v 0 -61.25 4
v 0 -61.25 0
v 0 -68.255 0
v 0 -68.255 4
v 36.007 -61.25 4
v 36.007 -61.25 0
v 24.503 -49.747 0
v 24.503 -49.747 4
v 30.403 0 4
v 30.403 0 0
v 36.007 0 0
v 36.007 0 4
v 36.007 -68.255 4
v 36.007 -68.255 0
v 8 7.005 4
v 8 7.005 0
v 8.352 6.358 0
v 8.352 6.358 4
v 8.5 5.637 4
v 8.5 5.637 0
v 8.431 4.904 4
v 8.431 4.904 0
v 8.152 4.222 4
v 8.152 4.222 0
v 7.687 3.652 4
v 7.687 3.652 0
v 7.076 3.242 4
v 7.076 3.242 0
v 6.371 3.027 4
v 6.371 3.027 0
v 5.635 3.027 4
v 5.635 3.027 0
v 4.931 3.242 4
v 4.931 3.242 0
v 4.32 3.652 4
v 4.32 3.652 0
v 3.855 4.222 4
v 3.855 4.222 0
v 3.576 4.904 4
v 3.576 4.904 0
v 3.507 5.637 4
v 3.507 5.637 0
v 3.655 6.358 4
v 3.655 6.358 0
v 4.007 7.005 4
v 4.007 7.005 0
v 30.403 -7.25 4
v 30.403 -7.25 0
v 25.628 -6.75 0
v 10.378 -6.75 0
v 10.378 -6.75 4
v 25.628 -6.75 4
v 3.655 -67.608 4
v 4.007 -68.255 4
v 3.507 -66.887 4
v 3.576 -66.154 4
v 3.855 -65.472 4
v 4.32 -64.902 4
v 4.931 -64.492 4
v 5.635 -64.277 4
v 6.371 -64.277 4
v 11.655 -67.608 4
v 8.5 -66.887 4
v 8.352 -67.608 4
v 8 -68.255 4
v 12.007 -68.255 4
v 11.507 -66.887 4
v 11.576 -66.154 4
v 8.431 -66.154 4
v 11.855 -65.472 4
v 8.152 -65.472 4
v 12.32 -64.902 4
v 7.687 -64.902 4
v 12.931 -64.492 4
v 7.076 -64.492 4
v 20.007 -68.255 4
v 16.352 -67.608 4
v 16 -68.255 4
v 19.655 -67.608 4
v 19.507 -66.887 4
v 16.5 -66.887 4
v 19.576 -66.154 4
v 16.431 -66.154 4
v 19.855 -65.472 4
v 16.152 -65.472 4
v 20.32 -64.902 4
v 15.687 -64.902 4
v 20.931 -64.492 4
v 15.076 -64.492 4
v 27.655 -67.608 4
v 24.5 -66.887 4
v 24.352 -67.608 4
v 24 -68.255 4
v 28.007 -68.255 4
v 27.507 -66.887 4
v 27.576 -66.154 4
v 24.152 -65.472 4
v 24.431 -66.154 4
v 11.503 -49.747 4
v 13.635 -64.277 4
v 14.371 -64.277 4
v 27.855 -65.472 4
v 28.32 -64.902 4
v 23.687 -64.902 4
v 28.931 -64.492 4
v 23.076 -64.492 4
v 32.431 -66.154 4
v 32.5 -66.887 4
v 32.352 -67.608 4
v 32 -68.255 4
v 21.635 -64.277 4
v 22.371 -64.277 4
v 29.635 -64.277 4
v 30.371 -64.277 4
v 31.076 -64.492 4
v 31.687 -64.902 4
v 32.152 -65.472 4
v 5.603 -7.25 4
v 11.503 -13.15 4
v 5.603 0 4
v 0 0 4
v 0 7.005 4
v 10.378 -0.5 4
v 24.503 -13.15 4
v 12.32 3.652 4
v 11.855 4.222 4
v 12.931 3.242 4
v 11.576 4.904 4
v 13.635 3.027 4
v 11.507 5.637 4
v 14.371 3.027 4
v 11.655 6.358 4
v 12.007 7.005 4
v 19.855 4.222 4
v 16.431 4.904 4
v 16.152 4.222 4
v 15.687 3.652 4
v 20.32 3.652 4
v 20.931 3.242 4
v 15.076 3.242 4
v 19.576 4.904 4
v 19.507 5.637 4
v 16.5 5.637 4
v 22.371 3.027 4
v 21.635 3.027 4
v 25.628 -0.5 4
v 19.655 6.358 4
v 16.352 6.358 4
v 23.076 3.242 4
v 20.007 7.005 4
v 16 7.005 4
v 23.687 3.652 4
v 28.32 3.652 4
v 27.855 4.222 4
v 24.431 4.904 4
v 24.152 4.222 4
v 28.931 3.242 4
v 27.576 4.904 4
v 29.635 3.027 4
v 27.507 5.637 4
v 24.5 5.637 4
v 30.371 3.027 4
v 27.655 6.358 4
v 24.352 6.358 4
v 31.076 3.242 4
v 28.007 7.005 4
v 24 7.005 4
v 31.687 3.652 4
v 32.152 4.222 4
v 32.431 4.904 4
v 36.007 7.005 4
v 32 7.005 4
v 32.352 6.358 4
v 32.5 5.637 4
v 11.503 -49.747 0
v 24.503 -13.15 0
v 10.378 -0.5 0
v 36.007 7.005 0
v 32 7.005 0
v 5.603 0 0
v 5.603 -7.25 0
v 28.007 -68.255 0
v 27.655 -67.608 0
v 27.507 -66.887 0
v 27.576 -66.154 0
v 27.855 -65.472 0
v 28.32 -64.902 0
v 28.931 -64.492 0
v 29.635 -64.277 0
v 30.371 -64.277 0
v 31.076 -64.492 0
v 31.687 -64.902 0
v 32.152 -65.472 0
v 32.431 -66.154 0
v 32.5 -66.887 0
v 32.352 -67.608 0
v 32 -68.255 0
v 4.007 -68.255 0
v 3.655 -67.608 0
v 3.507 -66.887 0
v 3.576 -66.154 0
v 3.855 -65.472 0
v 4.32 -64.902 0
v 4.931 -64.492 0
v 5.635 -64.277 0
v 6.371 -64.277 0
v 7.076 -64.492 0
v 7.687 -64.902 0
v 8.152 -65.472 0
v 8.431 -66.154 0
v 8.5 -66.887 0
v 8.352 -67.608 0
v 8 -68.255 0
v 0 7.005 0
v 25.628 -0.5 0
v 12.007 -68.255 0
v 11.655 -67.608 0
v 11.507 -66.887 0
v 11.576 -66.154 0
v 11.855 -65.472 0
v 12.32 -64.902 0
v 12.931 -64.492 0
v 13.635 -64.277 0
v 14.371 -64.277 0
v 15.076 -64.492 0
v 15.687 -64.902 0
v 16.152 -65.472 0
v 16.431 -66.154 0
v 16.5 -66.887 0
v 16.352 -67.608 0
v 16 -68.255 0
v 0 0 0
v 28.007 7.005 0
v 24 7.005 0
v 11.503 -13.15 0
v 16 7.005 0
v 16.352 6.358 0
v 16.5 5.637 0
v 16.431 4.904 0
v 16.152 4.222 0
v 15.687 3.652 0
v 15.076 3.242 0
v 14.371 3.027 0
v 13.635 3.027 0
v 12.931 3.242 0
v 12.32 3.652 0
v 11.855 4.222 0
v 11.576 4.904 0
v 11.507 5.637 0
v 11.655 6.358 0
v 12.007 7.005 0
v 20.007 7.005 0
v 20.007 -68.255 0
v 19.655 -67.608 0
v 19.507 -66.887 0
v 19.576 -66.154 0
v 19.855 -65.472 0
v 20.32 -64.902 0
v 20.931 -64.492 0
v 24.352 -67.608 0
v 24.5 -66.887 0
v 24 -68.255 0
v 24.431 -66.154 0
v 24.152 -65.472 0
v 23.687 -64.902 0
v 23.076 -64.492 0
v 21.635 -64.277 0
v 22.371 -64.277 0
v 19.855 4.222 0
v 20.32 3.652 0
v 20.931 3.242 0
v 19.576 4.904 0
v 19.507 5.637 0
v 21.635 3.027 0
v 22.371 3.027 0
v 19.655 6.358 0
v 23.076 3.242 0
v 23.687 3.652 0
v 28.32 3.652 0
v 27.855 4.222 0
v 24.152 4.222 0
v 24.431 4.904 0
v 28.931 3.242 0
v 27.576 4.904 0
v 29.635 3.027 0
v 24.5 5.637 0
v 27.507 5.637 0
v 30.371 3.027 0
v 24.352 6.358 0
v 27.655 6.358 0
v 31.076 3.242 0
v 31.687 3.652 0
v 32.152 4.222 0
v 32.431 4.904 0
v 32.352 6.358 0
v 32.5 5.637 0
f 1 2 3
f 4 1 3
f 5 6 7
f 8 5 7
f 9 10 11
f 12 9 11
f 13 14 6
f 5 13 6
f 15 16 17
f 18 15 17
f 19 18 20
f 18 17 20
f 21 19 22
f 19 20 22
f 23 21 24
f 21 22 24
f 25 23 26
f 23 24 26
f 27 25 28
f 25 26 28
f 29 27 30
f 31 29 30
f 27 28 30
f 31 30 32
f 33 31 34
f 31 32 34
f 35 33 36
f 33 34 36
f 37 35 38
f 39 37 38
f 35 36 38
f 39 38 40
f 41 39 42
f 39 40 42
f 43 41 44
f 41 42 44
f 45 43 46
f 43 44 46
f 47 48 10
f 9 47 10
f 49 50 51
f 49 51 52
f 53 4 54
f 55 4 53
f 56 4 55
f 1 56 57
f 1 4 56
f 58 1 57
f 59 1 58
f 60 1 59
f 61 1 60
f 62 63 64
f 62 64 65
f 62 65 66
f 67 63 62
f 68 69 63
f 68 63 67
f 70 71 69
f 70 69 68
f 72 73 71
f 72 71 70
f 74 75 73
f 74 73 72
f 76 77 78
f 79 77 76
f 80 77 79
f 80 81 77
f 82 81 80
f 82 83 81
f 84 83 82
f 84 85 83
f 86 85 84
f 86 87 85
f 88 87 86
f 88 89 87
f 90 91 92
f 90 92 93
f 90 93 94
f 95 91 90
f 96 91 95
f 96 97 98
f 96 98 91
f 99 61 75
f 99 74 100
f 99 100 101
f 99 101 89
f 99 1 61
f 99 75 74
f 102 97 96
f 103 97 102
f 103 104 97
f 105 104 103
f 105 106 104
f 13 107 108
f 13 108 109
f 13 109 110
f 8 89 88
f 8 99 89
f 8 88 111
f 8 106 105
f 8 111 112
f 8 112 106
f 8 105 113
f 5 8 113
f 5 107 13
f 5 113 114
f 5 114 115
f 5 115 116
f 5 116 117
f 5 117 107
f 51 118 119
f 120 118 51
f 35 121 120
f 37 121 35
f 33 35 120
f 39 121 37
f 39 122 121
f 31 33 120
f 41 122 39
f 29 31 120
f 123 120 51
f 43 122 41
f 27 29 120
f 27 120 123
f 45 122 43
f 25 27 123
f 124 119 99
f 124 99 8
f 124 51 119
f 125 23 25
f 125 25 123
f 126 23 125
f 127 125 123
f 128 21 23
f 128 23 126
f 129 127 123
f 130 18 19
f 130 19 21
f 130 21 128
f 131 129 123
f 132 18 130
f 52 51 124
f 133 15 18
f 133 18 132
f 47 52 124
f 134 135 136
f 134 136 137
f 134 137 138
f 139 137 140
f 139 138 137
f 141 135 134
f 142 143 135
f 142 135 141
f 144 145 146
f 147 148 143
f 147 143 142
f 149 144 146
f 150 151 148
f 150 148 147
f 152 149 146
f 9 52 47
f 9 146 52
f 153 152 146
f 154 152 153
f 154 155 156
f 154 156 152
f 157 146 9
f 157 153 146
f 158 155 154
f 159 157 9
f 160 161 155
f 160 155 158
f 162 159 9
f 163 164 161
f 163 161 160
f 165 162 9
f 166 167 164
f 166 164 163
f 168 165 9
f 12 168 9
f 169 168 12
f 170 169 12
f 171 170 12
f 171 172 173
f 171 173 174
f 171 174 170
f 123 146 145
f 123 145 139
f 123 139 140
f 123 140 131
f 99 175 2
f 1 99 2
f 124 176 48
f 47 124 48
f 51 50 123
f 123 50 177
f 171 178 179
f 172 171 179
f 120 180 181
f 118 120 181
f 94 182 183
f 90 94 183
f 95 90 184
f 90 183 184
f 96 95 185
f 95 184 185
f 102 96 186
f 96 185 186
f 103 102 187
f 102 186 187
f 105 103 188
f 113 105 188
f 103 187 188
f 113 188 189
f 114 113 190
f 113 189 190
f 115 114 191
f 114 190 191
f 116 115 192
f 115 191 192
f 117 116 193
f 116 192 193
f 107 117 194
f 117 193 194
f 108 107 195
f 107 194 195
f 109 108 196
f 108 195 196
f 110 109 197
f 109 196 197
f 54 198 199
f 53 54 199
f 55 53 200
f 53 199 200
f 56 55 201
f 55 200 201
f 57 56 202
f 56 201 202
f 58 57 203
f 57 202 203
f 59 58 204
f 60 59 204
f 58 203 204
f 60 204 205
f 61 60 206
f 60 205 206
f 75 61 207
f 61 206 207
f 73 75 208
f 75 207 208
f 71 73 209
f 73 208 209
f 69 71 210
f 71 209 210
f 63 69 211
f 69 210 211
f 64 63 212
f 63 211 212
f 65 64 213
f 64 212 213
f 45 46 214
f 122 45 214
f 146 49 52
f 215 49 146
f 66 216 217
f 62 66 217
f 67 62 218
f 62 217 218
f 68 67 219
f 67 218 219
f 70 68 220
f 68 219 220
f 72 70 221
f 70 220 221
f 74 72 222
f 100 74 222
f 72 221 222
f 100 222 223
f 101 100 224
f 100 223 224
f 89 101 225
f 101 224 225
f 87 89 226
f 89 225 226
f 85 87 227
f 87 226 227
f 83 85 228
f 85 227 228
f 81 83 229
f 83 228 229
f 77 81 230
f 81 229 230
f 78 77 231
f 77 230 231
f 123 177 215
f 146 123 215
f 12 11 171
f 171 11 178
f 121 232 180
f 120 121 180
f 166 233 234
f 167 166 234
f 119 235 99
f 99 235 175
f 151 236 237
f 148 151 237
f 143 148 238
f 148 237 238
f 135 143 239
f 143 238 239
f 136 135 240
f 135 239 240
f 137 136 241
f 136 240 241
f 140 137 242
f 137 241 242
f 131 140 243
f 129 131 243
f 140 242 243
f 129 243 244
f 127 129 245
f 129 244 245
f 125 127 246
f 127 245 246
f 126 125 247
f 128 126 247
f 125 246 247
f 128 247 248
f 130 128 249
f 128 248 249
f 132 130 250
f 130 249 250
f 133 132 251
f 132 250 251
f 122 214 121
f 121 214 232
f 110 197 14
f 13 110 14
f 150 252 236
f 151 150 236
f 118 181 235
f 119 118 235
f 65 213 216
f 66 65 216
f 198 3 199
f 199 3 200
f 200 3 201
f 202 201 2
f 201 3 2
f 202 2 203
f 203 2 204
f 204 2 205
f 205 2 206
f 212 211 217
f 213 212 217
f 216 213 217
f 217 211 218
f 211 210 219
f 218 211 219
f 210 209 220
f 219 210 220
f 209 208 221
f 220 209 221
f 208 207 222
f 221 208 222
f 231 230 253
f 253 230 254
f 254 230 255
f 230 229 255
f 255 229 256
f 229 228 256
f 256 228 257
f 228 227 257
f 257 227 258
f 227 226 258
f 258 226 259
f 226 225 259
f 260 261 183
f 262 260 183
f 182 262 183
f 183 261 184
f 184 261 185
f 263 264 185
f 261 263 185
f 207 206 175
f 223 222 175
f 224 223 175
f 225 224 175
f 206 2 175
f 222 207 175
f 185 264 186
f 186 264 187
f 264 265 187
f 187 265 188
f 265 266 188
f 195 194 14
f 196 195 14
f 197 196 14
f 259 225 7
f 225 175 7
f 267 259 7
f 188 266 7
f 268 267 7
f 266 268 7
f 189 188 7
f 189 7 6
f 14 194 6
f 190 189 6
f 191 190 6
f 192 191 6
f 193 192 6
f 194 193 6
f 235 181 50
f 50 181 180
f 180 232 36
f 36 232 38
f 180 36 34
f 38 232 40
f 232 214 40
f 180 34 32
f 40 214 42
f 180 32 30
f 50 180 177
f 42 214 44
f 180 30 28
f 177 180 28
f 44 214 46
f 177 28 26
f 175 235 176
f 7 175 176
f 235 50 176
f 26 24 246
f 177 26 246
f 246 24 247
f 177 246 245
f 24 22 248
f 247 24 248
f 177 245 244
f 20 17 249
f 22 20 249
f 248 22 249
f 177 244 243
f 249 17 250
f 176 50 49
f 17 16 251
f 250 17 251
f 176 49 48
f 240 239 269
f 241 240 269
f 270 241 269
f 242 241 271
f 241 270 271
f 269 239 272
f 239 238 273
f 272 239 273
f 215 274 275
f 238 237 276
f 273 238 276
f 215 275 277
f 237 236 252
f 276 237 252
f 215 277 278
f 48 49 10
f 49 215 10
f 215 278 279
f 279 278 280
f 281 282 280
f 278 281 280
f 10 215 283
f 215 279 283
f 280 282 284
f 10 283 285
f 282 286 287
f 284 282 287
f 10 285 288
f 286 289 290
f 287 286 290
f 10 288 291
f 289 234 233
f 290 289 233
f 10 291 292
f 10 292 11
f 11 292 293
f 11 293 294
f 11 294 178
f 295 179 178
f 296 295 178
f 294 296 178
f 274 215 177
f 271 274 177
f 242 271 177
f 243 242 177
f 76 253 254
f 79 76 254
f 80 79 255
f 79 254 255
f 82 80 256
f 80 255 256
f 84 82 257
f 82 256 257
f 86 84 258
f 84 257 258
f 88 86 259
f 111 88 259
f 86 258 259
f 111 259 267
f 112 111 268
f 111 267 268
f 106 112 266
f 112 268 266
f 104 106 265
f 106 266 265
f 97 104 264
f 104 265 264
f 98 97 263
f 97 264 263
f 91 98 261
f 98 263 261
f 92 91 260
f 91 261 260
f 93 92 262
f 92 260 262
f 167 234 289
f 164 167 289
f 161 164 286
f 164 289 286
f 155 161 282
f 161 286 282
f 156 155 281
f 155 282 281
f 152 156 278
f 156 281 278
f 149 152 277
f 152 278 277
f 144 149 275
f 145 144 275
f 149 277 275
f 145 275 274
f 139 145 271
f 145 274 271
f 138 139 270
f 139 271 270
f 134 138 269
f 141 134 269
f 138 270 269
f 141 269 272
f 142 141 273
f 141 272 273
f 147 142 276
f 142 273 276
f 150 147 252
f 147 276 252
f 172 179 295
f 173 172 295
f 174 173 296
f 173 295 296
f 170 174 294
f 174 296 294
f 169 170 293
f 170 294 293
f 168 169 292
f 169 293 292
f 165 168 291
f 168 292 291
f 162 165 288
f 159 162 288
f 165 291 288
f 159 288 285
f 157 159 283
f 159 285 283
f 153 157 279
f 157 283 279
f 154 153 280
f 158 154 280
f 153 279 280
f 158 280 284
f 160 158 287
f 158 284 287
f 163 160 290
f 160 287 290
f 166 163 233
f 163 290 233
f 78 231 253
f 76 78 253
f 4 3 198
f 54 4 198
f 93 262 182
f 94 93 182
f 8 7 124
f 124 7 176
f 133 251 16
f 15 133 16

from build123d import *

# Parameters (mm, degrees)
F0_W     = 15.25
F0_H     = 6.25
F1_DEPTH = 4


with BuildPart() as f1:
    # F0 (on Top) → F1 (new body)
    with BuildSketch(Plane.XY):
        with BuildLine():
            ThreePointArc((8, 7.004538), (6.003411, 3), (4.006822, 7.004538))
            Line((4.006822, 7.004538), (0, 7.004538))
            Line((0, 7.004538), (0, 0))
            Line((0, 0), (5.603411, 0))
            Line((5.603411, 0), (5.603411, -7.25))
            Line((5.603411, -7.25), (11.503411, -13.15))
            Line((11.503411, -13.15), (11.503411, -49.746589))
            Line((11.503411, -49.746589), (0, -61.25))
            Line((0, -61.25), (0, -68.254538))
            Line((0, -68.254538), (4.006822, -68.254538))
            ThreePointArc((4.006822, -68.254538), (6.003411, -64.25), (8, -68.254538))
            Line((8, -68.254538), (12.006822, -68.254538))
            ThreePointArc((12.006822, -68.254538), (14.003411, -64.25), (16, -68.254538))
            Line((16, -68.254538), (20.006822, -68.254538))
            ThreePointArc((20.006822, -68.254538), (22.003411, -64.25), (24, -68.254538))
            Line((24, -68.254538), (28.006822, -68.254538))
            ThreePointArc((28.006822, -68.254538), (30.003411, -64.25), (32, -68.254538))
            Line((32, -68.254538), (36.006822, -68.254538))
            Line((36.006822, -68.254538), (36.006822, -61.25))
            Line((36.006822, -61.25), (24.503411, -49.746589))
            Line((24.503411, -49.746589), (24.503411, -13.15))
            Line((24.503411, -13.15), (30.403411, -7.25))
            Line((30.403411, -7.25), (30.403411, 0))
            Line((30.403411, 0), (36.006822, 0))
            Line((36.006822, 0), (36.006822, 7.004538))
            Line((36.006822, 7.004538), (32, 7.004538))
            ThreePointArc((32, 7.004538), (30.003411, 3), (28.006822, 7.004538))
            Line((28.006822, 7.004538), (24, 7.004538))
            ThreePointArc((24, 7.004538), (22.003411, 3), (20.006822, 7.004538))
            Line((20.006822, 7.004538), (16, 7.004538))
            ThreePointArc((16, 7.004538), (14.003411, 3), (12.006822, 7.004538))
            Line((12.006822, 7.004538), (8, 7.004538))
        make_face()
        with Locations((18.003411, -3.625)):
            Rectangle(F0_W, F0_H, mode=Mode.SUBTRACT)
    extrude(amount=F1_DEPTH)


solid = f1.part
